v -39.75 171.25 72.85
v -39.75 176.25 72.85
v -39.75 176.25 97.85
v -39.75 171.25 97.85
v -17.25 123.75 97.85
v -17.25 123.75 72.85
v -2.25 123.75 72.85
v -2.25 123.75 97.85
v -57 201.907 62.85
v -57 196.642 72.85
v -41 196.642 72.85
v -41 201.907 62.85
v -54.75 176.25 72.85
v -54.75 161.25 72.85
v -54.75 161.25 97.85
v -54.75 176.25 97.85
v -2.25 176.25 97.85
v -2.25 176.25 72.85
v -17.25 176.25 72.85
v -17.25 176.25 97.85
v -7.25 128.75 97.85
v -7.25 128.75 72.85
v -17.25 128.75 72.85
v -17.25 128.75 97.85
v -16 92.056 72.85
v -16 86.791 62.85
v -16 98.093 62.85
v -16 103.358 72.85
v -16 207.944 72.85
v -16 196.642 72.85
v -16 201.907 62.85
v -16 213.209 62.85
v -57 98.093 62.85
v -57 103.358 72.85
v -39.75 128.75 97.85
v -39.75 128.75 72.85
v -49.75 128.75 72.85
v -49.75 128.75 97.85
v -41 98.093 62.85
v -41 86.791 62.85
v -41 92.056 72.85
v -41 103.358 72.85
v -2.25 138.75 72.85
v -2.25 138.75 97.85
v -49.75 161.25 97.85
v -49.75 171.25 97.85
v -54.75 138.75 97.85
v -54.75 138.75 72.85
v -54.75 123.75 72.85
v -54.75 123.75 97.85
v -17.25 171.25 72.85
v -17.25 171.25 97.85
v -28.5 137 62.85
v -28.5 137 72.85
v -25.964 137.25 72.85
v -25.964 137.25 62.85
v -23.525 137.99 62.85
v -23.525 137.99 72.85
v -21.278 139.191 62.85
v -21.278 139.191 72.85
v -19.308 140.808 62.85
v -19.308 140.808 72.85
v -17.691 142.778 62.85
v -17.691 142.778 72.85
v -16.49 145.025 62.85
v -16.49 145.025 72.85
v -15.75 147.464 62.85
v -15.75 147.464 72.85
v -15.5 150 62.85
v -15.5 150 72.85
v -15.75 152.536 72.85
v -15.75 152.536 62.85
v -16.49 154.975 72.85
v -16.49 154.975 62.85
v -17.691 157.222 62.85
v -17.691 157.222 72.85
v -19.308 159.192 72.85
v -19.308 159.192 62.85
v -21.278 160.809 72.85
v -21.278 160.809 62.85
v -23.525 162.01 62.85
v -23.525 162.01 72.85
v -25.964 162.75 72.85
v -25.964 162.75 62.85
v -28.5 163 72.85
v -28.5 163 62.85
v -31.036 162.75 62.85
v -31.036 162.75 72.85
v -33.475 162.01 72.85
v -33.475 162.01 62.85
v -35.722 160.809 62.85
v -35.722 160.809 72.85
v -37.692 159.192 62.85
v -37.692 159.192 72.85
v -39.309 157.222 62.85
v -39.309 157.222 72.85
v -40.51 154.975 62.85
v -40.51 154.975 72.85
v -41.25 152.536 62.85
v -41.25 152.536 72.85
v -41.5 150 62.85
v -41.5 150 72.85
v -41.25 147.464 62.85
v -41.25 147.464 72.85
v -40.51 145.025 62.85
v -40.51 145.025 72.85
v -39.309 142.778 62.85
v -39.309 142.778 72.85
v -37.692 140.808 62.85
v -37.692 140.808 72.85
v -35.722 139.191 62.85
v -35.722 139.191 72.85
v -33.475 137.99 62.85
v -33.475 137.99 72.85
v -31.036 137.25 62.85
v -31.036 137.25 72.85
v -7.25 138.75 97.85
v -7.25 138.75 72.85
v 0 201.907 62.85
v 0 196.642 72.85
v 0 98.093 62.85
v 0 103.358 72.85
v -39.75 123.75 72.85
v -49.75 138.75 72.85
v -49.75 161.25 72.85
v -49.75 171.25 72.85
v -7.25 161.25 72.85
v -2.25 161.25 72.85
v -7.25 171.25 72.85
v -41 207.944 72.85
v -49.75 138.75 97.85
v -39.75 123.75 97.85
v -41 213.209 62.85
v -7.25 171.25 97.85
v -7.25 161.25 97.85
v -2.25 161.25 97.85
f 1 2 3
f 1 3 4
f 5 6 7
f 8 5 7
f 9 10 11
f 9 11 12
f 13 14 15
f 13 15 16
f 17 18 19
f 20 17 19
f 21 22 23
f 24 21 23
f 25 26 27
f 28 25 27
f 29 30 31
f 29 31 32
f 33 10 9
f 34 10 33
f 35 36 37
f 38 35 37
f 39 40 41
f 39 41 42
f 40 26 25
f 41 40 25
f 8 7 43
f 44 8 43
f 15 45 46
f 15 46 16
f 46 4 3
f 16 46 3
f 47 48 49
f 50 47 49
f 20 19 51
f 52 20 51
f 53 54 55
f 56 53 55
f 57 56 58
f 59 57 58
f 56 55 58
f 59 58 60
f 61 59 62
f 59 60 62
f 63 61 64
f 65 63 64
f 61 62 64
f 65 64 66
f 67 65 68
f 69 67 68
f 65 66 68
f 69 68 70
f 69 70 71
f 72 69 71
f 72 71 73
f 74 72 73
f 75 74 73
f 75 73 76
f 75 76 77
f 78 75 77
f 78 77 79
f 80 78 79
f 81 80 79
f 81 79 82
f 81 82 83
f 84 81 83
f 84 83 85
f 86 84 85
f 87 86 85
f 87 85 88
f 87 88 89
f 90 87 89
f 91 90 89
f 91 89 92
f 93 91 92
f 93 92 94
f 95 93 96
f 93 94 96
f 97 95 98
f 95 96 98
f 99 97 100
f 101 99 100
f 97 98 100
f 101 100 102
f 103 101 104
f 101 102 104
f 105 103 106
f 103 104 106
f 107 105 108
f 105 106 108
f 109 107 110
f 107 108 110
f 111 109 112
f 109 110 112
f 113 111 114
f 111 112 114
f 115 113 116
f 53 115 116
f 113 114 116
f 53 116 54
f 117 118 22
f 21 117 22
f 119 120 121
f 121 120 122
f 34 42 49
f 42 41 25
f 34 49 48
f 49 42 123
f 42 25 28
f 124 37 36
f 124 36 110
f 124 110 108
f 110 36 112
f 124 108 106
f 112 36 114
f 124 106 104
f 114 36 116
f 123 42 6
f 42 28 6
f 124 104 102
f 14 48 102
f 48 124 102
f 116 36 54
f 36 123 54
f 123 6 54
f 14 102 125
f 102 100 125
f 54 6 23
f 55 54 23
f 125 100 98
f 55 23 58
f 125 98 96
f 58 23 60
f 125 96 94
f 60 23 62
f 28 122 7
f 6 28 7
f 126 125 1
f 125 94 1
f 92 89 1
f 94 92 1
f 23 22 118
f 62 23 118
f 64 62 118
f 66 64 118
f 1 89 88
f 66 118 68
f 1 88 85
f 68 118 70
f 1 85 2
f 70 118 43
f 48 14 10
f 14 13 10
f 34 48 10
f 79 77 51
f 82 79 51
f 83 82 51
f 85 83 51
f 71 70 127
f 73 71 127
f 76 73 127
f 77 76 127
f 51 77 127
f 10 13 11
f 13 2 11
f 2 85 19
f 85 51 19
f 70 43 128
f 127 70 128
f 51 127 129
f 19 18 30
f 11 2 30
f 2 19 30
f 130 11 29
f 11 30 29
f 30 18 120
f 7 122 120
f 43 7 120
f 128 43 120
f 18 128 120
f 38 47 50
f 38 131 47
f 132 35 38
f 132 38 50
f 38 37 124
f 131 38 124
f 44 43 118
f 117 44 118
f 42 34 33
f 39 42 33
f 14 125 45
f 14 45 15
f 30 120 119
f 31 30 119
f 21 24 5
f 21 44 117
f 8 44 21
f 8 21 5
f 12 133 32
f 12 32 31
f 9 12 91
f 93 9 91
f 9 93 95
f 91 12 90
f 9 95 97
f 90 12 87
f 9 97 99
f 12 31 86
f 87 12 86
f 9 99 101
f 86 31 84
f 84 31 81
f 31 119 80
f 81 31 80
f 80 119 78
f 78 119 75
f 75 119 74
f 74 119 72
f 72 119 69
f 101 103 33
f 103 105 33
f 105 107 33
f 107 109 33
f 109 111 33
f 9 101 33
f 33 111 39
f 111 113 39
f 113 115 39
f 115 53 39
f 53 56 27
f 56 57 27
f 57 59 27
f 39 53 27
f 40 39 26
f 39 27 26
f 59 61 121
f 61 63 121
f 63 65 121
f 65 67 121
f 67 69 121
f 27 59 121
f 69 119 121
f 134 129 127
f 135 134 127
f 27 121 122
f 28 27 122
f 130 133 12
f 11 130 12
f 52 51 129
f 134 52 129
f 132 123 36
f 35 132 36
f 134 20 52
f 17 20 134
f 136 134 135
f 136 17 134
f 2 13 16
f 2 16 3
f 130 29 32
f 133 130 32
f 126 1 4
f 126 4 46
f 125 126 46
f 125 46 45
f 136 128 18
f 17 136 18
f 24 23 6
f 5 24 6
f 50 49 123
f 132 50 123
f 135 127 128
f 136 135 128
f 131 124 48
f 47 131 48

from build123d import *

# Parameters (mm, degrees)
PAD051_DEPTH    = 57
POCKET043_DEPTH = 16
POCKET042_DEPTH = 16
SKETCH097_R     = 13
POCKET047_DEPTH = 10.001
PAD052_DEPTH    = 25


with BuildPart() as part:
    # Sketch095 → Pad051 (new body)
    with BuildSketch(Plane.YZ):
        Polygon((92.056432, 72.85), (207.943568, 72.85), (213.208897, 62.85), (86.791103, 62.85), align=None)
    extrude(amount=-PAD051_DEPTH)

    # Sketch098 (on Face5 of Pad051) → Pocket043 (cut)
    with BuildSketch(Plane.YZ):
        Polygon((86.791103, 62.85), (98.092594, 62.85), (103.357923, 72.85), (92.056432, 72.85), align=None)
        Polygon((207.943568, 72.85), (196.642077, 72.85), (201.907406, 62.85), (213.208897, 62.85), align=None)
    extrude(amount=-POCKET043_DEPTH, mode=Mode.SUBTRACT)

    # Sketch096 (on Face8 of Pocket043) → Pocket042 (cut)
    with BuildSketch(Plane(origin=(-57, 0, 0), x_dir=(0, 1, 0), z_dir=(-1, 0, 0))):
        Polygon((86.791103, -62.85), (92.056432, -72.85), (103.357923, -72.85), (98.092594, -62.85), align=None)
        Polygon((201.907406, -62.85), (213.208897, -62.85), (207.943568, -72.85), (196.642077, -72.85), align=None)
    extrude(amount=-POCKET042_DEPTH, mode=Mode.SUBTRACT)

    # Sketch097 (on Face1 of Pocket042) → Pocket047 (cut, through all)
    with BuildSketch(Plane(origin=(0, 0, 72.85), x_dir=(0, -1, 0), z_dir=(0, 0, 1))):
        with Locations((-150, -28.5)):
            Circle(SKETCH097_R)
    extrude(amount=-POCKET047_DEPTH, mode=Mode.SUBTRACT)

    # Sketch104 (on Face1 of Pocket047) → Pad052 (join)
    with BuildSketch(Plane(origin=(0, 0, 72.85), x_dir=(0, -1, 0), z_dir=(0, 0, 1))):
        Polygon((-176.25, -2.25), (-176.25, -17.25), (-171.25, -17.25), (-171.25, -7.25), (-161.25, -7.25), (-161.25, -2.25), align=None)
        Polygon((-128.75, -7.25), (-128.75, -17.25), (-123.75, -17.25), (-123.75, -2.25), (-138.75, -2.25), (-138.75, -7.25), align=None)
        Polygon((-138.75, -54.75), (-123.75, -54.75), (-123.75, -39.75), (-128.75, -39.75), (-128.75, -49.75), (-138.75, -49.75), align=None)
        Polygon((-171.25, -49.75), (-161.25, -49.75), (-161.25, -54.75), (-176.25, -54.75), (-176.25, -39.75), (-171.25, -39.75), align=None)
    extrude(amount=PAD052_DEPTH)


solid = part.part
